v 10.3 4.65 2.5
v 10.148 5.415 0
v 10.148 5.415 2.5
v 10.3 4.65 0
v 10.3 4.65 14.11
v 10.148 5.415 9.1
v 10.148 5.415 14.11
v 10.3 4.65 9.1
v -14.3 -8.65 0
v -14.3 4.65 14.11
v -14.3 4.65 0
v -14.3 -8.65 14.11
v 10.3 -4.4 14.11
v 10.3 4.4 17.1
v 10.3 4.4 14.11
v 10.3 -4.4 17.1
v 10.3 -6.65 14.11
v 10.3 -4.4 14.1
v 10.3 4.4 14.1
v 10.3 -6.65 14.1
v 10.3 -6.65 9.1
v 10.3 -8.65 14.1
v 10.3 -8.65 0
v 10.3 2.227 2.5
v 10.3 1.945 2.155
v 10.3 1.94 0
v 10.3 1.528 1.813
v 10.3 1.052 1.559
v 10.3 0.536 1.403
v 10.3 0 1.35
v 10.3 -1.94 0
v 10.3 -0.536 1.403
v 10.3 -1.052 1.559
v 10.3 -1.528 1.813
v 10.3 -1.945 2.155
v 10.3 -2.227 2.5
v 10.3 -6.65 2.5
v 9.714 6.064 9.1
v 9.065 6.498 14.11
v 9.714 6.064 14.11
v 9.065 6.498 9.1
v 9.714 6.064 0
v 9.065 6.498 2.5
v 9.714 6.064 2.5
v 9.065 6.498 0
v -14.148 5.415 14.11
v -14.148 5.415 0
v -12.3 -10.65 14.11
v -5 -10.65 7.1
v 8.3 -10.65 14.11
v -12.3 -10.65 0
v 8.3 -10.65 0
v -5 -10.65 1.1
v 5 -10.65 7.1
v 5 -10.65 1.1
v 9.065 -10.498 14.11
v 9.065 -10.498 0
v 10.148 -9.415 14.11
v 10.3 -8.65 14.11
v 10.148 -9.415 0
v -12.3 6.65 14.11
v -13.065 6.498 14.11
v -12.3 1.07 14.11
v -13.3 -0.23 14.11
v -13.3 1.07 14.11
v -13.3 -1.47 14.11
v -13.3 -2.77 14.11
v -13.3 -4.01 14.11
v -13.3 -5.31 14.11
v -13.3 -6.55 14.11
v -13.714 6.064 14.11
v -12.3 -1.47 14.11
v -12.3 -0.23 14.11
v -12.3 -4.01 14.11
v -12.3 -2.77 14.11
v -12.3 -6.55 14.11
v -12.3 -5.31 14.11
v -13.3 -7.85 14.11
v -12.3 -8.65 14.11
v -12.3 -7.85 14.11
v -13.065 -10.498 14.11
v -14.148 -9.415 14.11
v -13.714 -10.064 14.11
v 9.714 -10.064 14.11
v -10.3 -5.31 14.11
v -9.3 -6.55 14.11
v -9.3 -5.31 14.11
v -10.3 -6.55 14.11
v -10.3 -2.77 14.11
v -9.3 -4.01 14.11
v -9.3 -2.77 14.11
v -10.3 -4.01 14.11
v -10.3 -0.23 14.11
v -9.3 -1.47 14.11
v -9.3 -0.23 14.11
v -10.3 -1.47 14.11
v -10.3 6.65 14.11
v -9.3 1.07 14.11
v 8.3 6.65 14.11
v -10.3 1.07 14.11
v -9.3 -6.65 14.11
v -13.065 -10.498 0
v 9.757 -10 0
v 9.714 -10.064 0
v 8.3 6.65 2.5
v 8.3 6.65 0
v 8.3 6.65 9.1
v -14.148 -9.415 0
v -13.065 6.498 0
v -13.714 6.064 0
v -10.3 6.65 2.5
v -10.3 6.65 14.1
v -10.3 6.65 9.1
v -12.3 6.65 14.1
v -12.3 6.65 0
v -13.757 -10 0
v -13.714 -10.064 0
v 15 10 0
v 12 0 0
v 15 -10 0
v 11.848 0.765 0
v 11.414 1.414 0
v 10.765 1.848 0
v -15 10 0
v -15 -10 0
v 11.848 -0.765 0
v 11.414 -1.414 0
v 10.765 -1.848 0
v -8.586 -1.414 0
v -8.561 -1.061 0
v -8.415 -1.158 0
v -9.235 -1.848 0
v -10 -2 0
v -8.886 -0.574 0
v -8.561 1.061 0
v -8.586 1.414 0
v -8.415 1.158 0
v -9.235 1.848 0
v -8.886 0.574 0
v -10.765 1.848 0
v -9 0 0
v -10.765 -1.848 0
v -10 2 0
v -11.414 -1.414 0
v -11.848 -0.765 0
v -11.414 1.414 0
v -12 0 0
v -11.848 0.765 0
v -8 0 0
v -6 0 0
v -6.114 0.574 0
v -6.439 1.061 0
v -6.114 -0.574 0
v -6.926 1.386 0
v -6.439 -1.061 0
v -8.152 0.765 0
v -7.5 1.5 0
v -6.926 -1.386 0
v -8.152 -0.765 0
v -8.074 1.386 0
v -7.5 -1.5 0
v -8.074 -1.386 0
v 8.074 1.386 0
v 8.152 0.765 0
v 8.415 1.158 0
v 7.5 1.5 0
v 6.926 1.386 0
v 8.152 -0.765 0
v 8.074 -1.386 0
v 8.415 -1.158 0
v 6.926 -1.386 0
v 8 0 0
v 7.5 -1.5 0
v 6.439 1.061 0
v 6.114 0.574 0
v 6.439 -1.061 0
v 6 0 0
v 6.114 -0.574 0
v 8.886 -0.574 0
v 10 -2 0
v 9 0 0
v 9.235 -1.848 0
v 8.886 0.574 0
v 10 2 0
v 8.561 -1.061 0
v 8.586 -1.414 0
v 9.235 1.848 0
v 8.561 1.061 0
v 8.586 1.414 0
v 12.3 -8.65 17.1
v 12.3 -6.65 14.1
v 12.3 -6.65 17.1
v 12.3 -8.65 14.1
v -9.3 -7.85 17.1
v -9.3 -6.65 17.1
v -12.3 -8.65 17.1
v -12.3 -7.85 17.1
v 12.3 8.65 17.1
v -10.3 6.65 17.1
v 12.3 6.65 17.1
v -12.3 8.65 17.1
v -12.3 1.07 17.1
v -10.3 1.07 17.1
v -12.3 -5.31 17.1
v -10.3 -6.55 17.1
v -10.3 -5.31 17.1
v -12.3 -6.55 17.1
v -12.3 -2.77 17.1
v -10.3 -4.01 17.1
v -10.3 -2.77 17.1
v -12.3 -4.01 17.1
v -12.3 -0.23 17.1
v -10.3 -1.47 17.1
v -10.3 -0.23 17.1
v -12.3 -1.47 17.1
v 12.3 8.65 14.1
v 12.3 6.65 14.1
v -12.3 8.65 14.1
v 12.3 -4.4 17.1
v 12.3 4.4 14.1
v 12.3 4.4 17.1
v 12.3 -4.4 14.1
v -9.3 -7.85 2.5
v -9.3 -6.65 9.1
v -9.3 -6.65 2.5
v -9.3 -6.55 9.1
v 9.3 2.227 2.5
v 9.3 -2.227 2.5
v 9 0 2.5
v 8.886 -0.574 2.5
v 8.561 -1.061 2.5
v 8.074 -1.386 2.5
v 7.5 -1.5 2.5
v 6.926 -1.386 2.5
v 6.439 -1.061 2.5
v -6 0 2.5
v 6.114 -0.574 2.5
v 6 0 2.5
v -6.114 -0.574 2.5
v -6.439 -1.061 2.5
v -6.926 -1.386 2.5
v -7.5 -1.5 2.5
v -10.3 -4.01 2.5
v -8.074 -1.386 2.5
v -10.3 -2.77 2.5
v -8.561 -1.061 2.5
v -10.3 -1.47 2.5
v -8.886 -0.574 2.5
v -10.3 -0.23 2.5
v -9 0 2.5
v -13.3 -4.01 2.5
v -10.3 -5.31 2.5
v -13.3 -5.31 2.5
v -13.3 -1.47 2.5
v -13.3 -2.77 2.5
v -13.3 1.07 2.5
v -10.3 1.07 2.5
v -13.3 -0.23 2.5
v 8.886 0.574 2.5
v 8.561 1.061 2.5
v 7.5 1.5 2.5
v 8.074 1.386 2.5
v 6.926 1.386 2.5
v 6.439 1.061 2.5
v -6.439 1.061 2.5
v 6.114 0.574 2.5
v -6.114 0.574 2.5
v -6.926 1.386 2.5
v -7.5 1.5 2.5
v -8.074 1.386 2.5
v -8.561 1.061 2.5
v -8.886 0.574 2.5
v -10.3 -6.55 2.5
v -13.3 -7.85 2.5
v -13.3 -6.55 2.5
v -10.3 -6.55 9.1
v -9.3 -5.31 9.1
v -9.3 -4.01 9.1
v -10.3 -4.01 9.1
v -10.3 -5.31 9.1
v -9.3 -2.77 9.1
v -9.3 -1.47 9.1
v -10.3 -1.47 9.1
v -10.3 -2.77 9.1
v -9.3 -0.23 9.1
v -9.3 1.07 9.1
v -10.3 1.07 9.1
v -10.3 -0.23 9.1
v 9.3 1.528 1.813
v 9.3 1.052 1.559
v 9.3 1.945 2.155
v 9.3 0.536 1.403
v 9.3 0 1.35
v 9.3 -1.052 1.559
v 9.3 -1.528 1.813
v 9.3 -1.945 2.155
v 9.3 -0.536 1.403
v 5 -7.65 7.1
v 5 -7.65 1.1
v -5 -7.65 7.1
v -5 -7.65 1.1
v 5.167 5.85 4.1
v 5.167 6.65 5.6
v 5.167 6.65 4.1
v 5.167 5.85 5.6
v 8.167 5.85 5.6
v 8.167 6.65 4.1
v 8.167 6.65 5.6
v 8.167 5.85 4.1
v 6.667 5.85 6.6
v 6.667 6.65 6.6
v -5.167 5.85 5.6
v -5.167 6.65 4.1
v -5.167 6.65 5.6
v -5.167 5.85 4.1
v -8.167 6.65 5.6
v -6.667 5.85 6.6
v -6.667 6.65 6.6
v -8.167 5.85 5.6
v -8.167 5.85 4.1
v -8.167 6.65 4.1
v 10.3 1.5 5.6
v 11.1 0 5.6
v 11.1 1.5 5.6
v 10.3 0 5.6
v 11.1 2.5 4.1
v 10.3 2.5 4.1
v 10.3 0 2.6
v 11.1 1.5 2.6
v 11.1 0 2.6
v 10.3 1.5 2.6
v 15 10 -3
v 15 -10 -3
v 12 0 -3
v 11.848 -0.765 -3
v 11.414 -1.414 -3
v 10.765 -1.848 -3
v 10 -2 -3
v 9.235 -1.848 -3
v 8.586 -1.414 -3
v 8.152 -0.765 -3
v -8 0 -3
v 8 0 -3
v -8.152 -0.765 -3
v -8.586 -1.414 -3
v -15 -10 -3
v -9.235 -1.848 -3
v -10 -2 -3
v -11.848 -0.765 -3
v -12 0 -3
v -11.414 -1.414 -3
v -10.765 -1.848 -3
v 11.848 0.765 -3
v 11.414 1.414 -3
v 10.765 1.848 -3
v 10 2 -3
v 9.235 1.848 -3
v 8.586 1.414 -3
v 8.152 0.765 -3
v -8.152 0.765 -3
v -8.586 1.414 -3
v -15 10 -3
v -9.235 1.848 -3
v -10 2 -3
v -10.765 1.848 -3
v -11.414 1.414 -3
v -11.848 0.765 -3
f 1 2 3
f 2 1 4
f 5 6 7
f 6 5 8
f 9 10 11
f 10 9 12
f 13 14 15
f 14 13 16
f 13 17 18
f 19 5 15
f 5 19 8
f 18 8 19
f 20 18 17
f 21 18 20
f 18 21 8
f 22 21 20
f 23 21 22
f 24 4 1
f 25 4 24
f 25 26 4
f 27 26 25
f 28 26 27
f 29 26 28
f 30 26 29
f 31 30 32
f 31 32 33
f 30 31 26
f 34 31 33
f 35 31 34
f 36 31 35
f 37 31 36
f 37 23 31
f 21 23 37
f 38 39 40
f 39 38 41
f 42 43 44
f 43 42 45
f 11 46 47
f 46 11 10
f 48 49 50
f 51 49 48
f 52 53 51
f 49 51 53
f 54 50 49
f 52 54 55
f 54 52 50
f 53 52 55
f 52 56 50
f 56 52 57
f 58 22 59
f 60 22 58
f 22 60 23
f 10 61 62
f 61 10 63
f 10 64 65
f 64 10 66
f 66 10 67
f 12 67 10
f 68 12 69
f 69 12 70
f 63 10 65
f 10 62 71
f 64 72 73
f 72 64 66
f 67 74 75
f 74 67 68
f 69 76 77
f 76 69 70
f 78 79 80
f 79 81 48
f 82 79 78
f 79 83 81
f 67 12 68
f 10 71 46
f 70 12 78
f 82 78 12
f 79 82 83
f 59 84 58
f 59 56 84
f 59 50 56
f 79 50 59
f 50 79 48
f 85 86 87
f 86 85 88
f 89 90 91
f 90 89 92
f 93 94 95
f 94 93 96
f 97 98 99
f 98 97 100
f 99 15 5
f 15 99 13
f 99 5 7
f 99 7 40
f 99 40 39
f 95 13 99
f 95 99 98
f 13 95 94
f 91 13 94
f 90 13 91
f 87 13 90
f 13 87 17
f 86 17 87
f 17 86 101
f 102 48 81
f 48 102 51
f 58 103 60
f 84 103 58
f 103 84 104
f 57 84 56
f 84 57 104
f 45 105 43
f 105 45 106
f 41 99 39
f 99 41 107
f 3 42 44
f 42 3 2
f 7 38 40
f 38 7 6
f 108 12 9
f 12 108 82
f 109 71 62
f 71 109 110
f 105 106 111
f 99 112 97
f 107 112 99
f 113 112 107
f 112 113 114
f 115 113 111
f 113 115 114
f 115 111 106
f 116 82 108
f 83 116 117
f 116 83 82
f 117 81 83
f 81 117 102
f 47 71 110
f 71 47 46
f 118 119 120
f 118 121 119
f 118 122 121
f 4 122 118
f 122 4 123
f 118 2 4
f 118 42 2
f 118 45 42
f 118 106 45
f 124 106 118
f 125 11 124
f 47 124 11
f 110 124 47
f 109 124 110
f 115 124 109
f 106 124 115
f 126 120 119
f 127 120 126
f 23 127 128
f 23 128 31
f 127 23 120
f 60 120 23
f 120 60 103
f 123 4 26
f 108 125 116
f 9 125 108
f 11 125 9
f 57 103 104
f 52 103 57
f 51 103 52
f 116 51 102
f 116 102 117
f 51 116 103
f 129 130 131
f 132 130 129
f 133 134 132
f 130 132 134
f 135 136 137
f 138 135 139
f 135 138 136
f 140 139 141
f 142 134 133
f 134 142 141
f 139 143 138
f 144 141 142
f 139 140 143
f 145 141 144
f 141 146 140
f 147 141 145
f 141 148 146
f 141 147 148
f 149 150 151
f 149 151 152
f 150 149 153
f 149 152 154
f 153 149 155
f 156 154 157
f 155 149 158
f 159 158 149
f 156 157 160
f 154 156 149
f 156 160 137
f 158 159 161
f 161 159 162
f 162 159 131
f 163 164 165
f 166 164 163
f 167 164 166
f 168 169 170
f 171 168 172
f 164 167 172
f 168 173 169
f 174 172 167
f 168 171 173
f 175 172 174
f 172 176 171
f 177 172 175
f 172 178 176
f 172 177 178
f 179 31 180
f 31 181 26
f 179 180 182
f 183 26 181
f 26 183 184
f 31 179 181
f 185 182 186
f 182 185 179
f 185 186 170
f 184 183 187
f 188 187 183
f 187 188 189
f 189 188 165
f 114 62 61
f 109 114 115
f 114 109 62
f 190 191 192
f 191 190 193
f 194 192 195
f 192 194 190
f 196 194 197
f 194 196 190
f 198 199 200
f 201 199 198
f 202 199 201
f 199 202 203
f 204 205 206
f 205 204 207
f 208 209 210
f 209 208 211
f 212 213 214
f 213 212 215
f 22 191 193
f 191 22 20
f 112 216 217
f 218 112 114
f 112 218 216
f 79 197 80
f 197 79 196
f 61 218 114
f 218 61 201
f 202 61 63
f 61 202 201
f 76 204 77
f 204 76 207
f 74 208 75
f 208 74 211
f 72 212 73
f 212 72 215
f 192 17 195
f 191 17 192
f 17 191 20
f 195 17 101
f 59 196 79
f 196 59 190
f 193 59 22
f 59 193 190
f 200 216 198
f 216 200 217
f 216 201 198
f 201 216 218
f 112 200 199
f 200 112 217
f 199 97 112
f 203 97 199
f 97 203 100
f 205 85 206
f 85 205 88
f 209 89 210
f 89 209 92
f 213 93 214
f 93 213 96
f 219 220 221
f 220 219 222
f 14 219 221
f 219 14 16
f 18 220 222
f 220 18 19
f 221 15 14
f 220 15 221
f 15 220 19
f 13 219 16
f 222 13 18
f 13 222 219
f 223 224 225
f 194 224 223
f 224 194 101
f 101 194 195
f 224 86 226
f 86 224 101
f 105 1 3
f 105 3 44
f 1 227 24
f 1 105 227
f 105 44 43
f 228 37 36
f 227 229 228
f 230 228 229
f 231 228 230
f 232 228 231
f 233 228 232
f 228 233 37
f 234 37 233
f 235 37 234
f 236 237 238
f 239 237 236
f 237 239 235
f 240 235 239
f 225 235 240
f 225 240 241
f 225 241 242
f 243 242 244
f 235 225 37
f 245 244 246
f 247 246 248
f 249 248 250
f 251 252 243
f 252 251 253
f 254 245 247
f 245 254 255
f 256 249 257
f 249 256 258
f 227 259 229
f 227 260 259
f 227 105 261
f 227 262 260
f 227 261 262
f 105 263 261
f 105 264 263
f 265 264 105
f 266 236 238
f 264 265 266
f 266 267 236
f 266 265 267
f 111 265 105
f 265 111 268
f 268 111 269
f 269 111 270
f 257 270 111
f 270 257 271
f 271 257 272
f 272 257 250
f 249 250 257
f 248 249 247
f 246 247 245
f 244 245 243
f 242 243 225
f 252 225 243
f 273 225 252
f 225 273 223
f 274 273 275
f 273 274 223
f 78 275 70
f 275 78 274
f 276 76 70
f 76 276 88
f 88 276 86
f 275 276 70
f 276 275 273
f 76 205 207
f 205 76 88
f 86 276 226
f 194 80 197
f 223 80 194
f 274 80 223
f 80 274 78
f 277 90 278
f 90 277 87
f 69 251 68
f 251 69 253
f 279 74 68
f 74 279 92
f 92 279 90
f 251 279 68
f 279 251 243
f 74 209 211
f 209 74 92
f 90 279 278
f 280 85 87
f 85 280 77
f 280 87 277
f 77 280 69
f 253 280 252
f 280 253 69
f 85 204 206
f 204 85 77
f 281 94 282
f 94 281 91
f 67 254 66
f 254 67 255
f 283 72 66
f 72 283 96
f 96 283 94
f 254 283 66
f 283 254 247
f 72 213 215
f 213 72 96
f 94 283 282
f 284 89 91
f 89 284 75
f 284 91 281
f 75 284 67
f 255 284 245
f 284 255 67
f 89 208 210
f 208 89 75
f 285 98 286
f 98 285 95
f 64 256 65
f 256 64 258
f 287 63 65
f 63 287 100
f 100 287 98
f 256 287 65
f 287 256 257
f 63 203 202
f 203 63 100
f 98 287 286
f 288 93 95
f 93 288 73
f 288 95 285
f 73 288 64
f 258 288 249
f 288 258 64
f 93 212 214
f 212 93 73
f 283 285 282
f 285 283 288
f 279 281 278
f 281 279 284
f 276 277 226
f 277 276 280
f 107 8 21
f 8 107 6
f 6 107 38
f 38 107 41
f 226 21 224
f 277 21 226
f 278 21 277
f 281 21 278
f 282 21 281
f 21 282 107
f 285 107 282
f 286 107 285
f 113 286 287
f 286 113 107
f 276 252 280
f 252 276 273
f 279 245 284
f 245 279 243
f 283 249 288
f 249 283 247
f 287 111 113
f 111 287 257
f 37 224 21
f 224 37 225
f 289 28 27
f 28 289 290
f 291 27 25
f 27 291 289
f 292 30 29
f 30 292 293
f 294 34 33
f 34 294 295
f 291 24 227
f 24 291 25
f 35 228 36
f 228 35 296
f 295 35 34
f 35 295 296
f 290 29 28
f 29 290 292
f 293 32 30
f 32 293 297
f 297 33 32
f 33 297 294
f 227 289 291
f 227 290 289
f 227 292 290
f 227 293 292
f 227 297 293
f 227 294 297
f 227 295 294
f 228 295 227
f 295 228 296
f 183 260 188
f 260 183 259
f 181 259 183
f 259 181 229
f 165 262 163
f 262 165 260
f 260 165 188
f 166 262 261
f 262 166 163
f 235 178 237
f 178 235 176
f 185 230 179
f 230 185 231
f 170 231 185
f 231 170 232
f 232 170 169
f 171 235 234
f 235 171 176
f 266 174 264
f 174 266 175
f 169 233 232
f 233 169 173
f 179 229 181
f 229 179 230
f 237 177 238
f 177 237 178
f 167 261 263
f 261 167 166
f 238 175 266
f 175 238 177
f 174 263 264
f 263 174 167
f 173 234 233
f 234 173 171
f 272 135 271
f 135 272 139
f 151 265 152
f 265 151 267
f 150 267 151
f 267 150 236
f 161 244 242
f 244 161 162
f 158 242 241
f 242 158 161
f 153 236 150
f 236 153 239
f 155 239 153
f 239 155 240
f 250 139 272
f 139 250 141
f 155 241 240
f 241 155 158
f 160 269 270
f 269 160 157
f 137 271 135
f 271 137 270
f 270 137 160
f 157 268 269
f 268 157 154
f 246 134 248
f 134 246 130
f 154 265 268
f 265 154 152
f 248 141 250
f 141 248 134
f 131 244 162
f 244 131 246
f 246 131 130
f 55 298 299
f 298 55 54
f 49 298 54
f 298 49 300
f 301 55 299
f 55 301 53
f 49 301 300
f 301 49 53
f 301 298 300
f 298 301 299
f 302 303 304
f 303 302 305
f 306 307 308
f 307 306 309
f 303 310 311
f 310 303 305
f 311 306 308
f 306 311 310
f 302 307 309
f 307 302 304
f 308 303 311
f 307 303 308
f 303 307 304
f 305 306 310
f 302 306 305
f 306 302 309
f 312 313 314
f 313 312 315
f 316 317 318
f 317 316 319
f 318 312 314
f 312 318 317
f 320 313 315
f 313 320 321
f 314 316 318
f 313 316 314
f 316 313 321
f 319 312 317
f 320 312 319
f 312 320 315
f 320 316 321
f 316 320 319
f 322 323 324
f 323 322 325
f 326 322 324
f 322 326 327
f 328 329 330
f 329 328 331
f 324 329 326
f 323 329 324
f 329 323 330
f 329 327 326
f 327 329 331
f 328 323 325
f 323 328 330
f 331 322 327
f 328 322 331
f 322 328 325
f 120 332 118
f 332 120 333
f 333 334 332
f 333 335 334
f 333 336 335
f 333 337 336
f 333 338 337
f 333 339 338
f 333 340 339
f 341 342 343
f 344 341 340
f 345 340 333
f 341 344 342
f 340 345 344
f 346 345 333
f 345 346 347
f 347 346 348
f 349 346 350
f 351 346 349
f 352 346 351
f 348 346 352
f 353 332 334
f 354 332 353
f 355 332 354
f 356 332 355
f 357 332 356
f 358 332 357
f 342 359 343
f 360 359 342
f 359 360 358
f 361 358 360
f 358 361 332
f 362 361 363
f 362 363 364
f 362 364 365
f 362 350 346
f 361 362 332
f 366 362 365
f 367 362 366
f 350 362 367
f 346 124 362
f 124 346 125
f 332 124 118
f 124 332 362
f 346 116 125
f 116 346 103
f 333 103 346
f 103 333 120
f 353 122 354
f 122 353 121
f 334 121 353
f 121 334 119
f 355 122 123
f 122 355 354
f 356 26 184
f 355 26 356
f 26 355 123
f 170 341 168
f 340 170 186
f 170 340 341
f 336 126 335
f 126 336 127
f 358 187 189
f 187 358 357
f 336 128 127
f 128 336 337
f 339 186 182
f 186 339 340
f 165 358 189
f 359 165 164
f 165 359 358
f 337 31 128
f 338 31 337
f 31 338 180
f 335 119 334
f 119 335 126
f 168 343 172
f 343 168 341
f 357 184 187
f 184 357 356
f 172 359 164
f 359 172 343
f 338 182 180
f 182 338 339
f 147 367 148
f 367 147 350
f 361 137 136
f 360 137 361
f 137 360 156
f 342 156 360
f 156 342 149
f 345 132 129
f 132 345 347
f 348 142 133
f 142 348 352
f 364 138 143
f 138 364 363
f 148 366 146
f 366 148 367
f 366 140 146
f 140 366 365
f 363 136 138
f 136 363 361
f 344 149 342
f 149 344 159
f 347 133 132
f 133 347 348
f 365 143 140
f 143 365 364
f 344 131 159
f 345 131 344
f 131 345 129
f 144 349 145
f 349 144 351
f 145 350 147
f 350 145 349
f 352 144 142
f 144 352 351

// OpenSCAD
// file: vl53l0x_case.scad
/*
 * VL53L0X V2 TOF Sensor Case - Open Design
 * 3D Printable holder for VL53L0X sensor with soldered pins
 * 
 * Creative open design with easy sensor insertion
 * - Open top for easy sensor placement
 * - Side slots for pin access
 * - Snap-fit retention tabs
 * - Clear visual guide for sensor placement
 */

// ==========================================
// CONFIGURATION PARAMETERS
// ==========================================

// PCB dimensions
pcb_length = 20.0;      // Length of PCB (mm)
pcb_width = 12.7;       // Width of PCB (mm)
pcb_thickness = 1.6;    // PCB thickness (mm)

// Pin configuration
pin_spacing = 2.54;     // Standard pin spacing (mm)
pin_count = 4;          // Number of pins (VCC, GND, SDA, SCL)
pin_diameter = 0.8;     // Pin diameter (mm)
pin_length = 10.0;      // Length of pins below PCB (mm)

// Sensor lens
lens_diameter = 4.5;    // Sensor lens diameter (mm)
lens_height = 1.0;      // Lens protrusion above PCB (mm)

// Case dimensions
wall_thickness = 2.0;   // Wall thickness (mm)
base_thickness = 2.5;   // Base thickness (mm)
side_wall_height = 3.0; // Height of side walls (mm)
corner_radius = 2.0;    // Rounded corners (mm)

// Clearances
pcb_clearance = 0.3;    // Clearance around PCB for easy insertion
pin_clearance = 0.5;    // Clearance around pins

// Mounting holes
mount_hole_diameter = 3.0;  // M3 screw hole
mount_hole_spacing = 15.0;   // Distance between mounting holes

// Retention tabs
tab_width = 3.0;        // Width of retention tabs
tab_thickness = 0.8;   // Thickness of tabs
tab_height = 1.5;      // Height tabs extend above PCB

// ==========================================
// CALCULATED DIMENSIONS
// ==========================================

total_length = pcb_length + (pcb_clearance * 2) + (wall_thickness * 2);
total_width = pcb_width + (pcb_clearance * 2) + (wall_thickness * 2);
base_height = base_thickness + pcb_thickness + pin_length;

// Pin positions (centered on PCB, along one edge)
pin_start_x = -(pin_count - 1) * pin_spacing / 2;
pin_y_position = -pcb_width / 2 - 1.5; // Pins on bottom edge

// ==========================================
// MAIN CASE BASE
// ==========================================

module rounded_rect(size, r) {
    translate([-size[0]/2, -size[1]/2, 0])
        minkowski() {
            cube([size[0] - r*2, size[1] - r*2, size[2]]);
            cylinder(r=r, h=0.01, $fn=16);
        }
}

module case_base() {
    // Main base with rounded corners
    rounded_rect([total_length, total_width, base_height], corner_radius);
    
    // Side walls (partial, not full height)
    translate([-total_length/2, -total_width/2, base_height])
        cube([total_length, wall_thickness, side_wall_height]);
    translate([-total_length/2, total_width/2 - wall_thickness, base_height])
        cube([total_length, wall_thickness, side_wall_height]);
    
    // Back wall (where pins exit)
    translate([-total_length/2, -total_width/2, base_height])
        cube([wall_thickness, total_width, side_wall_height]);
    
    // Front wall (partial, with lens opening)
    front_wall_width = total_width - lens_diameter - 4;
    translate([total_length/2 - wall_thickness, -front_wall_width/2, base_height])
        cube([wall_thickness, front_wall_width, side_wall_height]);
}

// ==========================================
// CUTOUTS AND OPENINGS
// ==========================================

module case_cutouts() {
    // PCB cavity (open top for easy insertion)
    translate([
        -pcb_length/2 - pcb_clearance,
        -pcb_width/2 - pcb_clearance,
        base_thickness
    ])
        cube([
            pcb_length + (pcb_clearance * 2),
            pcb_width + (pcb_clearance * 2),
            pcb_thickness + 5
        ]);
    
    // Sensor lens opening (front)
    translate([
        total_length/2 - wall_thickness - 1,
        0,
        base_thickness + pcb_thickness
    ])
        rotate([0, 90, 0])
            cylinder(h = wall_thickness + 2, d = lens_diameter + 1, $fn=32);
    
    // Pin exit slots (back wall)
    for (i = [0:pin_count-1]) {
        translate([
            -total_length/2 - 1,
            pin_y_position + (i * pin_spacing),
            base_thickness
        ])
            cube([
                wall_thickness + 2,
                pin_diameter + pin_clearance,
                pin_length + 5
            ]);
    }
    
    // Mounting holes
    translate([mount_hole_spacing/2, 0, -1])
        cylinder(h = base_thickness + 2, d = mount_hole_diameter, $fn=16);
    translate([-mount_hole_spacing/2, 0, -1])
        cylinder(h = base_thickness + 2, d = mount_hole_diameter, $fn=16);
    
    // Wire routing channel (optional)
    translate([0, -total_width/2 - 1, base_thickness + pcb_thickness])
        cube([10, 4, 6], center=true);
}

// ==========================================
// RETENTION TABS
// ==========================================

module retention_tabs() {
    // Front tabs (hold PCB in place)
    tab_positions = [
        [pcb_length/3, pcb_width/2 + pcb_clearance],
        [-pcb_length/3, pcb_width/2 + pcb_clearance]
    ];
    
    for (pos = tab_positions) {
        translate([pos[0], pos[1], base_thickness + pcb_thickness])
            rotate([90, 0, 0])
                linear_extrude(height = tab_thickness)
                    polygon([
                        [-tab_width/2, 0],
                        [tab_width/2, 0],
                        [tab_width/2, tab_height],
                        [0, tab_height + 1],
                        [-tab_width/2, tab_height]
                    ]);
    }
    
    // Side tabs
    translate([pcb_length/2 + pcb_clearance, 0, base_thickness + pcb_thickness])
        rotate([0, 90, 0])
            linear_extrude(height = tab_thickness)
                polygon([
                    [-tab_width/2, 0],
                    [tab_width/2, 0],
                    [tab_width/2, tab_height],
                    [0, tab_height + 1],
                    [-tab_width/2, tab_height]
                ]);
}

// ==========================================
// VISUAL GUIDES (optional, for reference)
// ==========================================

module pcb_outline() {
    %translate([-pcb_length/2, -pcb_width/2, base_thickness])
        color("green", 0.3)
            cube([pcb_length, pcb_width, pcb_thickness]);
    
    %translate([0, pcb_width/2 + 1, base_thickness + pcb_thickness])
        color("red", 0.5)
            cylinder(h = lens_height, d = lens_diameter, $fn=32);
}

// ==========================================
// MAIN CASE ASSEMBLY
// ==========================================

module vl53l0x_case() {
    difference() {
        case_base();
        case_cutouts();
    }
    
    // Add retention tabs
    retention_tabs();
    
    // Visual guide (comment out for final print)
    // pcb_outline();
}

// ==========================================
// RENDER
// ==========================================

vl53l0x_case();

// ==========================================
// INSTRUCTIONS
// ==========================================
/*
 * ASSEMBLY INSTRUCTIONS:
 * 
 * 1. Print the case with base flat on bed
 * 2. The case has an OPEN TOP - sensor slides in from above
 * 3. Place VL53L0X sensor into the cavity:
 *    - PCB sits on the base platform
 *    - Sensor lens faces forward (toward lens opening)
 *    - Pins point backward (toward pin slots)
 * 4. Pins will pass through slots in the back wall
 * 5. Retention tabs will hold the PCB in place
 * 6. Use M3 screws through mounting holes to attach
 * 
 * The design is intentionally open on top for easy insertion!
 */
// main file
/*
 * VL53L0X V2 TOF Sensor Case with Mounting Bracket
 * Alternative design with integrated mounting bracket
 * 
 * This variant includes a mounting bracket for attachment to robotic arm
 * 
 * Note: This is a standalone version. Copy the vl53l0x_case() module
 * from vl53l0x_case.scad or include it using: include <vl53l0x_case.scad>
 */

// Include the main case design
include <vl53l0x_case.scad>

// ==========================================
// MOUNTING BRACKET CONFIGURATION
// ==========================================

bracket_length = 30.0;      // Length of mounting bracket
bracket_width = 20.0;        // Width of mounting bracket
bracket_thickness = 3.0;     // Thickness of bracket
bracket_hole_diameter = 4.0; // M4 mounting hole
bracket_hole_spacing = 20.0; // Spacing between bracket holes

// ==========================================
// MOUNTING BRACKET
// ==========================================

module mounting_bracket() {
    difference() {
        // Bracket base
        translate([-bracket_length/2, -bracket_width/2, -bracket_thickness])
            cube([bracket_length, bracket_width, bracket_thickness]);
        
        // Mounting holes
        translate([bracket_hole_spacing/2, 0, -bracket_thickness - 1])
            cylinder(h = bracket_thickness + 2, d = bracket_hole_diameter, $fn=16);
        translate([-bracket_hole_spacing/2, 0, -bracket_thickness - 1])
            cylinder(h = bracket_thickness + 2, d = bracket_hole_diameter, $fn=16);
    }
}

// ==========================================
// COMBINED CASE WITH BRACKET
// ==========================================

module vl53l0x_case_with_mount() {
    // Main case
    vl53l0x_case();
    
    // Mounting bracket
    mounting_bracket();
}

// ==========================================
// RENDER
// ==========================================

vl53l0x_case_with_mount();
